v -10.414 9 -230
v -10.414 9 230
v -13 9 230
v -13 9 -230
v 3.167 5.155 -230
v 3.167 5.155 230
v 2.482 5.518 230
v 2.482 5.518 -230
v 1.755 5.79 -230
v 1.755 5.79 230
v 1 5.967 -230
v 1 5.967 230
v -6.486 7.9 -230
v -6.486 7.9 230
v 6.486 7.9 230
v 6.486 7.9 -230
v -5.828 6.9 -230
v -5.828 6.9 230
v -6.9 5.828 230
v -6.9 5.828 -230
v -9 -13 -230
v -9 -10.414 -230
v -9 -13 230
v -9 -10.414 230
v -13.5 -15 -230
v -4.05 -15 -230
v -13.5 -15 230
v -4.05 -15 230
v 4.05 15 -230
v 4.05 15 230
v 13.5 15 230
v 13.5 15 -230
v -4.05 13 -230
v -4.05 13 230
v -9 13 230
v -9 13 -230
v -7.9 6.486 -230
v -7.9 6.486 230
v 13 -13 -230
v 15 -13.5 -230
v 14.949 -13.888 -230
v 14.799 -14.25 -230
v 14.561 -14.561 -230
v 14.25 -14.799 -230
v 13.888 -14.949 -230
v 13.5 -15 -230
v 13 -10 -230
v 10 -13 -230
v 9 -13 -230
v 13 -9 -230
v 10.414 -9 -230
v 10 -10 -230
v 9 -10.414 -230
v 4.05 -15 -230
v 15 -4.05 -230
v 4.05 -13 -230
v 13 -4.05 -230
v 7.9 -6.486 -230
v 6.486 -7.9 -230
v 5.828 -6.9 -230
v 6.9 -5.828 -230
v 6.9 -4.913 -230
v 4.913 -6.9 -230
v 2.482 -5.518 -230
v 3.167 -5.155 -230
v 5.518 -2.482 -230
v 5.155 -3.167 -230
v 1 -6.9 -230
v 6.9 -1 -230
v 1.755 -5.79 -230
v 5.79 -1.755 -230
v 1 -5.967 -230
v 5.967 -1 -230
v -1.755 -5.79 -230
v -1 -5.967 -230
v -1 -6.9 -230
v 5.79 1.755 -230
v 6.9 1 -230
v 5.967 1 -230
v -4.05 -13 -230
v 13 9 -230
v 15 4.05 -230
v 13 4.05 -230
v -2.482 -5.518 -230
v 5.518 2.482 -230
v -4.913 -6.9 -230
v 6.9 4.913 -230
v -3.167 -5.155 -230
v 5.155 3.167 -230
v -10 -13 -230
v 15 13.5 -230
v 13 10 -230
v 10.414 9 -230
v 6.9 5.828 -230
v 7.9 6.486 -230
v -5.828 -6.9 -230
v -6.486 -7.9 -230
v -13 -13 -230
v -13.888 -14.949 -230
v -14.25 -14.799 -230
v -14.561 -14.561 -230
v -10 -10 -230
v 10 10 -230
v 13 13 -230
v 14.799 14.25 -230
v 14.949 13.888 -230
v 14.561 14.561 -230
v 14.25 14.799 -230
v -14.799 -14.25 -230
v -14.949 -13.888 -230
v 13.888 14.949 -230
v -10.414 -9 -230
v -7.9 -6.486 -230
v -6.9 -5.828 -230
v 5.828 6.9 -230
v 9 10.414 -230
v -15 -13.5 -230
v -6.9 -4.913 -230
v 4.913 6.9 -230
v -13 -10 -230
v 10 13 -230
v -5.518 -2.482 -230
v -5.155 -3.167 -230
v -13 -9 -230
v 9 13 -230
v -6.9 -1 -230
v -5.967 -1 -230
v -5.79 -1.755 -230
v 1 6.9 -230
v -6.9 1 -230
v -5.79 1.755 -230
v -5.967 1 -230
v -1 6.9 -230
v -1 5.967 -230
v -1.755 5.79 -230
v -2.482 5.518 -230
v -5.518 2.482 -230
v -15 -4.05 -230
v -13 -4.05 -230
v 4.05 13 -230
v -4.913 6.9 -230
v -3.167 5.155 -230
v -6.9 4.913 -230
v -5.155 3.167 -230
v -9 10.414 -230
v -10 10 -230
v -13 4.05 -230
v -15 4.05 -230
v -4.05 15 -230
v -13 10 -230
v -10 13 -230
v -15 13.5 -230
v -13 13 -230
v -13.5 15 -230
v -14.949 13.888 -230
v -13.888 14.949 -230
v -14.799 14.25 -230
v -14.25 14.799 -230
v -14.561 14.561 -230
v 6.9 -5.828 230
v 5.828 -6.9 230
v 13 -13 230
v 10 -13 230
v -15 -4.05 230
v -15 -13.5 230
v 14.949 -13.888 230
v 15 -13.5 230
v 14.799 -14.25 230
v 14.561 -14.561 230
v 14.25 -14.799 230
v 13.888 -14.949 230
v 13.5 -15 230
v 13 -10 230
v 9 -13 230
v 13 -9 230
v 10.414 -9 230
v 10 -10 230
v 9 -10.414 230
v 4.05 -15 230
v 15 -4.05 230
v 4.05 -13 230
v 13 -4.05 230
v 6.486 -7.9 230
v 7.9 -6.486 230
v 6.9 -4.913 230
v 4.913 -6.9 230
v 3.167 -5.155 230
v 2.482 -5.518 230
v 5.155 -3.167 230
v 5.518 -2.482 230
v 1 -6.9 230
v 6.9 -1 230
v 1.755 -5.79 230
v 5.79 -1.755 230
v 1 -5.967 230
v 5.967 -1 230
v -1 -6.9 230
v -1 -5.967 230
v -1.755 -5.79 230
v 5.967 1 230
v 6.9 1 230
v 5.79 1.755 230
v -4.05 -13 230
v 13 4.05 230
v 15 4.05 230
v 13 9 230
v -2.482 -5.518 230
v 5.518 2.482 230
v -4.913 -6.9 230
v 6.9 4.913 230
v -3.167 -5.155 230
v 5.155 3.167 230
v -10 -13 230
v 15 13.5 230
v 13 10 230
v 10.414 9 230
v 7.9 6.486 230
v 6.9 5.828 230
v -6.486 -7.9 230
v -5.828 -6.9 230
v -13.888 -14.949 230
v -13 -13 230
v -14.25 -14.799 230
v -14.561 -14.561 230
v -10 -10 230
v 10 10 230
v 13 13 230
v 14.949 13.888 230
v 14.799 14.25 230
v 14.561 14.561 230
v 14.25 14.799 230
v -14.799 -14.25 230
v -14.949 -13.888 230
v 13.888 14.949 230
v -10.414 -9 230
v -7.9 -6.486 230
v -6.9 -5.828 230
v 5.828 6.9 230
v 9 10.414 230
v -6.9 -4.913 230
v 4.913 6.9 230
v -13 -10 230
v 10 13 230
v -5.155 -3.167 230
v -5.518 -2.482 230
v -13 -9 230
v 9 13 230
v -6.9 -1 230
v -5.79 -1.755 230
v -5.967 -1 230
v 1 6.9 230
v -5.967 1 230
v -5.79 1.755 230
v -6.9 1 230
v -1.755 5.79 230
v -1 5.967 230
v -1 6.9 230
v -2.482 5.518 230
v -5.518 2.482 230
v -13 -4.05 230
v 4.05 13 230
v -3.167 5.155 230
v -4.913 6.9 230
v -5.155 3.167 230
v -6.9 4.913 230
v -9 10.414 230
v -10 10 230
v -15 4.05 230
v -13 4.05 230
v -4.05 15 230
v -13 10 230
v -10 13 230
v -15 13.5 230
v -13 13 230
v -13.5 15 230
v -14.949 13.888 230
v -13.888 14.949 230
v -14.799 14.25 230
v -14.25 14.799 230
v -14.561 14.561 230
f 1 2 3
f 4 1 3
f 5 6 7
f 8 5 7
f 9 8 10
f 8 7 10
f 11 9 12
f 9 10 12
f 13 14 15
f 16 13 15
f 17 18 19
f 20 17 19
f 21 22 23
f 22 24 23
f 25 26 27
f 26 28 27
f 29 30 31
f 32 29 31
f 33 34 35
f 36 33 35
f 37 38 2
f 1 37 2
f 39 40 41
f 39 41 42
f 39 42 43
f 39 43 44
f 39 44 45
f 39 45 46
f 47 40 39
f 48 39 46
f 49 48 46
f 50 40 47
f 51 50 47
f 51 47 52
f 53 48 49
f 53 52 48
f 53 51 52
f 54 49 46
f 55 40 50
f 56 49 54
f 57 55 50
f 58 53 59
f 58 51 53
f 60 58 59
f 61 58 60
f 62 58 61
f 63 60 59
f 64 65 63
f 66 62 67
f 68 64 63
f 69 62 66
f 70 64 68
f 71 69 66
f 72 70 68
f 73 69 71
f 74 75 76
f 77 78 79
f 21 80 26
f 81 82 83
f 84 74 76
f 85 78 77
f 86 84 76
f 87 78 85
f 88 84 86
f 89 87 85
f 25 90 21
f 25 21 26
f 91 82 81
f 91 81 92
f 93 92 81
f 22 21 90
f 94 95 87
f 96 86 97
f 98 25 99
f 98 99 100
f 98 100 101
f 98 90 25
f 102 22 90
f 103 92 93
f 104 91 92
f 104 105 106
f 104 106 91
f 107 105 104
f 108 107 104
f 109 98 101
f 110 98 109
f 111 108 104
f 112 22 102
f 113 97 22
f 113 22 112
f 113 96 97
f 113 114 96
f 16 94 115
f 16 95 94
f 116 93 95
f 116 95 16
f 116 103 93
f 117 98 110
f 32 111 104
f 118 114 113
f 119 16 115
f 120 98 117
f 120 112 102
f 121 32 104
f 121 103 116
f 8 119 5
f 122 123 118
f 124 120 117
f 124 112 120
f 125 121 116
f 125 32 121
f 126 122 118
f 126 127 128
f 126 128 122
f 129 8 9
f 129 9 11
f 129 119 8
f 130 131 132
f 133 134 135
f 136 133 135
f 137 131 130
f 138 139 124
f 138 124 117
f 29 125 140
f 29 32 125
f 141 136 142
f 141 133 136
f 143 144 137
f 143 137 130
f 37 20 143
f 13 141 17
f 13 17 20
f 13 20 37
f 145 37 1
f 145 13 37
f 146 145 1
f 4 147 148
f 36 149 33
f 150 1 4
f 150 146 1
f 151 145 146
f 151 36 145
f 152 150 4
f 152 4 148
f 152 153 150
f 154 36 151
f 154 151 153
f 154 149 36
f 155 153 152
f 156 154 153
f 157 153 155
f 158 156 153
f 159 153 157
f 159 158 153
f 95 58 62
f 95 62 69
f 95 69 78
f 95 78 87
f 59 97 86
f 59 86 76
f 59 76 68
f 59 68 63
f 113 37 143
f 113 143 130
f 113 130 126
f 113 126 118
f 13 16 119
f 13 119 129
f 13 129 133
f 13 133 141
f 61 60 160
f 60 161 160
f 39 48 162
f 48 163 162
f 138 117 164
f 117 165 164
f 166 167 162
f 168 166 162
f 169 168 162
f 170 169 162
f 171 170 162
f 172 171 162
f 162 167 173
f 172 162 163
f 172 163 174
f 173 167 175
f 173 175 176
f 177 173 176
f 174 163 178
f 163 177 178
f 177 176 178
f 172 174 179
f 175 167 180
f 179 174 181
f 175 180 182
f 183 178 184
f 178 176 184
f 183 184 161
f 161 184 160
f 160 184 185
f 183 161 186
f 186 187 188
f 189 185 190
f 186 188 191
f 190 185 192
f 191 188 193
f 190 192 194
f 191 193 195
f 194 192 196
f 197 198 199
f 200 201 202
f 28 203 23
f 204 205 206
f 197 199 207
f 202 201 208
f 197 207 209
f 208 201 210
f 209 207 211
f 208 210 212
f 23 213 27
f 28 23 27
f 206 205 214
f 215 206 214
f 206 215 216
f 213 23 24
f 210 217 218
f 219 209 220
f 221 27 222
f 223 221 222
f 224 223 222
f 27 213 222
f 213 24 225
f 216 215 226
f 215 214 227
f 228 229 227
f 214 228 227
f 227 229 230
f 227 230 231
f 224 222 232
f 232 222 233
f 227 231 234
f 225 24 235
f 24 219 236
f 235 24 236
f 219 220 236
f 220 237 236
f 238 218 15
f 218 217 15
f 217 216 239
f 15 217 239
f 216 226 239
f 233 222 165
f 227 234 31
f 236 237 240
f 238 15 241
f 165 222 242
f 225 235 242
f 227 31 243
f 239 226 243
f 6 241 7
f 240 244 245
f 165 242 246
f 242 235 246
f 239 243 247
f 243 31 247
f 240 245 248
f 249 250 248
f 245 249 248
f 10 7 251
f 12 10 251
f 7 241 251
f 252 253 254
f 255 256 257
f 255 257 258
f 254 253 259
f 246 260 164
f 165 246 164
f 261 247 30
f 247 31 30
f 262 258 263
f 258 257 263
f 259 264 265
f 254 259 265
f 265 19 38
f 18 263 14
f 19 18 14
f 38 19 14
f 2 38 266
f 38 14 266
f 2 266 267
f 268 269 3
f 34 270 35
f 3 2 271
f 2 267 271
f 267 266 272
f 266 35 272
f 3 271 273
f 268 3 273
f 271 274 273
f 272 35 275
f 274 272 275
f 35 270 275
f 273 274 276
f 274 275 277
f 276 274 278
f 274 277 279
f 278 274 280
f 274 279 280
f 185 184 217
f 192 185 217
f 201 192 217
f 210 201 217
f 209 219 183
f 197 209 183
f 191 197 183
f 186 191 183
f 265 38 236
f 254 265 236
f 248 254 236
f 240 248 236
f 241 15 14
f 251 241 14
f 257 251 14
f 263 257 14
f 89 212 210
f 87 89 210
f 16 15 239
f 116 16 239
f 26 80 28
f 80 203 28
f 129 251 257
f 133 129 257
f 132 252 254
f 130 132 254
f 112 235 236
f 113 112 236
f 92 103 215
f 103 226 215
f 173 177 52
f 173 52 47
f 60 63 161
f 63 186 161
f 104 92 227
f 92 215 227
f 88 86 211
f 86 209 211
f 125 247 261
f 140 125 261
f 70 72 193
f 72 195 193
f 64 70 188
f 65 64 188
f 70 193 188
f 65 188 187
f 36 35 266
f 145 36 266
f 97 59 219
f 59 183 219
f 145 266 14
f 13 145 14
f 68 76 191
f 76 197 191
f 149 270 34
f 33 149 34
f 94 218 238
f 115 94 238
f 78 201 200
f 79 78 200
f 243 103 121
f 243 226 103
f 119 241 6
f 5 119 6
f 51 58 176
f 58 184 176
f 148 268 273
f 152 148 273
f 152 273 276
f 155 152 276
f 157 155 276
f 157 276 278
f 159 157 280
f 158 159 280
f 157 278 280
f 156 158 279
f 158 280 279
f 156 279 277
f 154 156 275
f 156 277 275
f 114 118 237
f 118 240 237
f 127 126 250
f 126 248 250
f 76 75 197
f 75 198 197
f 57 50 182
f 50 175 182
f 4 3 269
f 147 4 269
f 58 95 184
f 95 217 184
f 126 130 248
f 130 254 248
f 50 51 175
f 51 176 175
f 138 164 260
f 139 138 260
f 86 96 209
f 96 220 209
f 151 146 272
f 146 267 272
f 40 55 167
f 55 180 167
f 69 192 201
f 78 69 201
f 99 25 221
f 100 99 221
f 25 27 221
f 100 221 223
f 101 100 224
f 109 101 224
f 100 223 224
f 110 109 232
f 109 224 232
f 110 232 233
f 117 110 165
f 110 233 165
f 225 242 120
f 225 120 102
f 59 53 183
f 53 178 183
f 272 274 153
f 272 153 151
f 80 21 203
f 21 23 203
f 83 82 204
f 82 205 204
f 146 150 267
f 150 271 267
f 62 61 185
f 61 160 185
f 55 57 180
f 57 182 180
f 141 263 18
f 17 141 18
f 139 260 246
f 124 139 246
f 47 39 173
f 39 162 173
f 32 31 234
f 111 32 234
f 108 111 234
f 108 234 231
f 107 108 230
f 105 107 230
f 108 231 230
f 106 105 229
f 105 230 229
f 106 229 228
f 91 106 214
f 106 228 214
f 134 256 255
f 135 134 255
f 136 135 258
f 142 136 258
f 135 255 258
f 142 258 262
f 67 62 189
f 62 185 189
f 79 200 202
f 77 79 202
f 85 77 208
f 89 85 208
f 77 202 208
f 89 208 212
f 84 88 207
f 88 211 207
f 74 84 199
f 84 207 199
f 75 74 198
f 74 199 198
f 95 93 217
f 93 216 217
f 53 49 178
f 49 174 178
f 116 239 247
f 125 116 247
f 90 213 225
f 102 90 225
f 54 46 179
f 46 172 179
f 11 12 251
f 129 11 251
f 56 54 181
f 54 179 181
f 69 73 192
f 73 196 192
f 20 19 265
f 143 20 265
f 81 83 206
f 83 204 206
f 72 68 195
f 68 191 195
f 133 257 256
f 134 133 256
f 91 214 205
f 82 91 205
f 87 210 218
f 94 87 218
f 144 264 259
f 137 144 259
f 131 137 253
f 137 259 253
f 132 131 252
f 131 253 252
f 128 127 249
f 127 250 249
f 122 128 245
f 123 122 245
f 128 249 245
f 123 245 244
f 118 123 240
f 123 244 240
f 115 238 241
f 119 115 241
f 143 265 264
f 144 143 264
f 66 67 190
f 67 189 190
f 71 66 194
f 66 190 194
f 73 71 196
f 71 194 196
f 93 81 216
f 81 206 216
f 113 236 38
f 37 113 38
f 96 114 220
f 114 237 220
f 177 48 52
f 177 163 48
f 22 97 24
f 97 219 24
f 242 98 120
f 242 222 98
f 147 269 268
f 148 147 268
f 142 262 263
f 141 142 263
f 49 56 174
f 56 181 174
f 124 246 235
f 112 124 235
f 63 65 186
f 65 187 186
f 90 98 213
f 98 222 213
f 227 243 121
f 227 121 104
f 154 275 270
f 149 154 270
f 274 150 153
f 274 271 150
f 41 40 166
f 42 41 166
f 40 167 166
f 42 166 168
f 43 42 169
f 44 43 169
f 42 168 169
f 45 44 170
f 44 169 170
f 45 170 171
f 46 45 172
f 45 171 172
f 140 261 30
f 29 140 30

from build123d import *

# Parameters (mm, degrees)
ESBO_O1_W                = 3
ESBO_O1_H                = 3
RESSALTO_EXTRUS_O1_DEPTH = 230


with BuildPart() as part:
    # Esboço1 → Ressalto-extrusão1 (new, symmetric)
    with BuildSketch(Plane.XY):
        with BuildLine():
            Line((15, 13.5), (15, 4.05))
            Line((15, 4.05), (13, 4.05))
            Line((13, 4.05), (13, 9))
            Line((13, 9), (10.414213562, 9))
            Line((10.414213562, 9), (7.9, 6.485786438))
            Line((7.9, 6.485786438), (7.9, -7.36e-07))
            Line((7.9, -7.36e-07), (7.9, -6.485786438))
            Line((7.9, -6.485786438), (10.414213562, -9))
            Line((10.414213562, -9), (13, -9))
            Line((13, -9), (13, -4.05))
            Line((13, -4.05), (15, -4.05))
            Line((15, -4.05), (15, -13.5))
            ThreePointArc((15, -13.5), (14.560660172, -14.560660172), (13.5, -15))
            Line((13.5, -15), (4.05, -15))
            Line((4.05, -15), (4.05, -13))
            Line((4.05, -13), (9, -13))
            Line((9, -13), (9, -10.414213562))
            Line((9, -10.414213562), (6.485786438, -7.9))
            Line((6.485786438, -7.9), (-7.36e-07, -7.9))
            Line((-7.36e-07, -7.9), (-6.485786438, -7.9))
            Line((-6.485786438, -7.9), (-9, -10.414213562))
            Line((-9, -10.414213562), (-9, -13))
            Line((-9, -13), (-4.05, -13))
            Line((-4.05, -13), (-4.05, -15))
            Line((-4.05, -15), (-13.5, -15))
            ThreePointArc((-13.5, -15), (-14.560660172, -14.560660172), (-15, -13.5))
            Line((-15, -13.5), (-15, -4.05))
            Line((-15, -4.05), (-13, -4.05))
            Line((-13, -4.05), (-13, -9))
            Line((-13, -9), (-10.414213562, -9))
            Line((-10.414213562, -9), (-7.9, -6.485786438))
            Line((-7.9, -6.485786438), (-7.9, 7.36e-07))
            Line((-7.9, 7.36e-07), (-7.9, 6.485786438))
            Line((-7.9, 6.485786438), (-10.414213562, 9))
            Line((-10.414213562, 9), (-13, 9))
            Line((-13, 9), (-13, 4.05))
            Line((-13, 4.05), (-15, 4.05))
            Line((-15, 4.05), (-15, 13.5))
            ThreePointArc((-15, 13.5), (-14.560660172, 14.560660172), (-13.5, 15))
            Line((-13.5, 15), (-4.05, 15))
            Line((-4.05, 15), (-4.05, 13))
            Line((-4.05, 13), (-9, 13))
            Line((-9, 13), (-9, 10.414213562))
            Line((-9, 10.414213562), (-6.485786438, 7.9))
            Line((-6.485786438, 7.9), (7.36e-07, 7.9))
            Line((7.36e-07, 7.9), (6.485786438, 7.9))
            Line((6.485786438, 7.9), (9, 10.414213562))
            Line((9, 10.414213562), (9, 13))
            Line((9, 13), (4.05, 13))
            Line((4.05, 13), (4.05, 15))
            Line((4.05, 15), (13.5, 15))
            ThreePointArc((13.5, 15), (14.560660172, 14.560660172), (15, 13.5))
        make_face()
        with Locations((-11.5, 11.5)):
            Rectangle(ESBO_O1_W, ESBO_O1_H, mode=Mode.SUBTRACT)
        with BuildLine():
            Line((-6.9, 1.000000736), (-6.9, 7.36e-07))
            Line((-6.9, 7.36e-07), (-6.9, -1.000000736))
            Line((-6.9, -1.000000736), (-5.966782929, -1.000000736))
            ThreePointArc((-5.966782929, -1.000000736), (-5.665339038, -2.122836212), (-5.154690025, -3.167281286))
            Line((-5.154690025, -3.167281286), (-6.9, -4.91259126))
            Line((-6.9, -4.91259126), (-6.9, -5.827922061))
            Line((-6.9, -5.827922061), (-5.827922061, -6.9))
            Line((-5.827922061, -6.9), (-4.91259126, -6.9))
            Line((-4.91259126, -6.9), (-3.167281286, -5.154690025))
            ThreePointArc((-3.167281286, -5.154690025), (-2.122836212, -5.665339038), (-1.000000736, -5.966782929))
            Line((-1.000000736, -5.966782929), (-1.000000736, -6.9))
            Line((-1.000000736, -6.9), (-7.36e-07, -6.9))
            Line((-7.36e-07, -6.9), (1.000000736, -6.9))
            Line((1.000000736, -6.9), (1.000000736, -5.966782929))
            ThreePointArc((1.000000736, -5.966782929), (2.122836212, -5.665339038), (3.167281286, -5.154690025))
            Line((3.167281286, -5.154690025), (4.91259126, -6.9))
            Line((4.91259126, -6.9), (5.827922061, -6.9))
            Line((5.827922061, -6.9), (6.9, -5.827922061))
            Line((6.9, -5.827922061), (6.9, -4.91259126))
            Line((6.9, -4.91259126), (5.154690025, -3.167281286))
            ThreePointArc((5.154690025, -3.167281286), (5.665339038, -2.122836212), (5.966782929, -1.000000736))
            Line((5.966782929, -1.000000736), (6.9, -1.000000736))
            Line((6.9, -1.000000736), (6.9, -7.36e-07))
            Line((6.9, -7.36e-07), (6.9, 1.000000736))
            Line((6.9, 1.000000736), (5.966782929, 1.000000736))
            ThreePointArc((5.966782929, 1.000000736), (5.665339038, 2.122836212), (5.154690025, 3.167281286))
            Line((5.154690025, 3.167281286), (6.9, 4.91259126))
            Line((6.9, 4.91259126), (6.9, 5.827922061))
            Line((6.9, 5.827922061), (5.827922061, 6.9))
            Line((5.827922061, 6.9), (4.91259126, 6.9))
            Line((4.91259126, 6.9), (3.167281286, 5.154690025))
            ThreePointArc((3.167281286, 5.154690025), (2.122836212, 5.665339038), (1.000000736, 5.966782929))
            Line((1.000000736, 5.966782929), (1.000000736, 6.9))
            Line((1.000000736, 6.9), (7.36e-07, 6.9))
            Line((7.36e-07, 6.9), (-1.000000736, 6.9))
            Line((-1.000000736, 6.9), (-1.000000736, 5.966782929))
            ThreePointArc((-1.000000736, 5.966782929), (-2.122836212, 5.665339038), (-3.167281286, 5.154690025))
            Line((-3.167281286, 5.154690025), (-4.91259126, 6.9))
            Line((-4.91259126, 6.9), (-5.827922061, 6.9))
            Line((-5.827922061, 6.9), (-6.9, 5.827922061))
            Line((-6.9, 5.827922061), (-6.9, 4.91259126))
            Line((-6.9, 4.91259126), (-5.154690025, 3.167281286))
            ThreePointArc((-5.154690025, 3.167281286), (-5.665339038, 2.122836212), (-5.966782929, 1.000000736))
            Line((-5.966782929, 1.000000736), (-6.9, 1.000000736))
        make_face(mode=Mode.SUBTRACT)
        with Locations((11.5, 11.5)):
            Rectangle(ESBO_O1_W, ESBO_O1_H, mode=Mode.SUBTRACT)
        with Locations((11.5, -11.5)):
            Rectangle(ESBO_O1_W, ESBO_O1_H, mode=Mode.SUBTRACT)
        with Locations((-11.5, -11.5)):
            Rectangle(ESBO_O1_W, ESBO_O1_H, mode=Mode.SUBTRACT)
    extrude(amount=RESSALTO_EXTRUS_O1_DEPTH, both=True)


solid = part.part
